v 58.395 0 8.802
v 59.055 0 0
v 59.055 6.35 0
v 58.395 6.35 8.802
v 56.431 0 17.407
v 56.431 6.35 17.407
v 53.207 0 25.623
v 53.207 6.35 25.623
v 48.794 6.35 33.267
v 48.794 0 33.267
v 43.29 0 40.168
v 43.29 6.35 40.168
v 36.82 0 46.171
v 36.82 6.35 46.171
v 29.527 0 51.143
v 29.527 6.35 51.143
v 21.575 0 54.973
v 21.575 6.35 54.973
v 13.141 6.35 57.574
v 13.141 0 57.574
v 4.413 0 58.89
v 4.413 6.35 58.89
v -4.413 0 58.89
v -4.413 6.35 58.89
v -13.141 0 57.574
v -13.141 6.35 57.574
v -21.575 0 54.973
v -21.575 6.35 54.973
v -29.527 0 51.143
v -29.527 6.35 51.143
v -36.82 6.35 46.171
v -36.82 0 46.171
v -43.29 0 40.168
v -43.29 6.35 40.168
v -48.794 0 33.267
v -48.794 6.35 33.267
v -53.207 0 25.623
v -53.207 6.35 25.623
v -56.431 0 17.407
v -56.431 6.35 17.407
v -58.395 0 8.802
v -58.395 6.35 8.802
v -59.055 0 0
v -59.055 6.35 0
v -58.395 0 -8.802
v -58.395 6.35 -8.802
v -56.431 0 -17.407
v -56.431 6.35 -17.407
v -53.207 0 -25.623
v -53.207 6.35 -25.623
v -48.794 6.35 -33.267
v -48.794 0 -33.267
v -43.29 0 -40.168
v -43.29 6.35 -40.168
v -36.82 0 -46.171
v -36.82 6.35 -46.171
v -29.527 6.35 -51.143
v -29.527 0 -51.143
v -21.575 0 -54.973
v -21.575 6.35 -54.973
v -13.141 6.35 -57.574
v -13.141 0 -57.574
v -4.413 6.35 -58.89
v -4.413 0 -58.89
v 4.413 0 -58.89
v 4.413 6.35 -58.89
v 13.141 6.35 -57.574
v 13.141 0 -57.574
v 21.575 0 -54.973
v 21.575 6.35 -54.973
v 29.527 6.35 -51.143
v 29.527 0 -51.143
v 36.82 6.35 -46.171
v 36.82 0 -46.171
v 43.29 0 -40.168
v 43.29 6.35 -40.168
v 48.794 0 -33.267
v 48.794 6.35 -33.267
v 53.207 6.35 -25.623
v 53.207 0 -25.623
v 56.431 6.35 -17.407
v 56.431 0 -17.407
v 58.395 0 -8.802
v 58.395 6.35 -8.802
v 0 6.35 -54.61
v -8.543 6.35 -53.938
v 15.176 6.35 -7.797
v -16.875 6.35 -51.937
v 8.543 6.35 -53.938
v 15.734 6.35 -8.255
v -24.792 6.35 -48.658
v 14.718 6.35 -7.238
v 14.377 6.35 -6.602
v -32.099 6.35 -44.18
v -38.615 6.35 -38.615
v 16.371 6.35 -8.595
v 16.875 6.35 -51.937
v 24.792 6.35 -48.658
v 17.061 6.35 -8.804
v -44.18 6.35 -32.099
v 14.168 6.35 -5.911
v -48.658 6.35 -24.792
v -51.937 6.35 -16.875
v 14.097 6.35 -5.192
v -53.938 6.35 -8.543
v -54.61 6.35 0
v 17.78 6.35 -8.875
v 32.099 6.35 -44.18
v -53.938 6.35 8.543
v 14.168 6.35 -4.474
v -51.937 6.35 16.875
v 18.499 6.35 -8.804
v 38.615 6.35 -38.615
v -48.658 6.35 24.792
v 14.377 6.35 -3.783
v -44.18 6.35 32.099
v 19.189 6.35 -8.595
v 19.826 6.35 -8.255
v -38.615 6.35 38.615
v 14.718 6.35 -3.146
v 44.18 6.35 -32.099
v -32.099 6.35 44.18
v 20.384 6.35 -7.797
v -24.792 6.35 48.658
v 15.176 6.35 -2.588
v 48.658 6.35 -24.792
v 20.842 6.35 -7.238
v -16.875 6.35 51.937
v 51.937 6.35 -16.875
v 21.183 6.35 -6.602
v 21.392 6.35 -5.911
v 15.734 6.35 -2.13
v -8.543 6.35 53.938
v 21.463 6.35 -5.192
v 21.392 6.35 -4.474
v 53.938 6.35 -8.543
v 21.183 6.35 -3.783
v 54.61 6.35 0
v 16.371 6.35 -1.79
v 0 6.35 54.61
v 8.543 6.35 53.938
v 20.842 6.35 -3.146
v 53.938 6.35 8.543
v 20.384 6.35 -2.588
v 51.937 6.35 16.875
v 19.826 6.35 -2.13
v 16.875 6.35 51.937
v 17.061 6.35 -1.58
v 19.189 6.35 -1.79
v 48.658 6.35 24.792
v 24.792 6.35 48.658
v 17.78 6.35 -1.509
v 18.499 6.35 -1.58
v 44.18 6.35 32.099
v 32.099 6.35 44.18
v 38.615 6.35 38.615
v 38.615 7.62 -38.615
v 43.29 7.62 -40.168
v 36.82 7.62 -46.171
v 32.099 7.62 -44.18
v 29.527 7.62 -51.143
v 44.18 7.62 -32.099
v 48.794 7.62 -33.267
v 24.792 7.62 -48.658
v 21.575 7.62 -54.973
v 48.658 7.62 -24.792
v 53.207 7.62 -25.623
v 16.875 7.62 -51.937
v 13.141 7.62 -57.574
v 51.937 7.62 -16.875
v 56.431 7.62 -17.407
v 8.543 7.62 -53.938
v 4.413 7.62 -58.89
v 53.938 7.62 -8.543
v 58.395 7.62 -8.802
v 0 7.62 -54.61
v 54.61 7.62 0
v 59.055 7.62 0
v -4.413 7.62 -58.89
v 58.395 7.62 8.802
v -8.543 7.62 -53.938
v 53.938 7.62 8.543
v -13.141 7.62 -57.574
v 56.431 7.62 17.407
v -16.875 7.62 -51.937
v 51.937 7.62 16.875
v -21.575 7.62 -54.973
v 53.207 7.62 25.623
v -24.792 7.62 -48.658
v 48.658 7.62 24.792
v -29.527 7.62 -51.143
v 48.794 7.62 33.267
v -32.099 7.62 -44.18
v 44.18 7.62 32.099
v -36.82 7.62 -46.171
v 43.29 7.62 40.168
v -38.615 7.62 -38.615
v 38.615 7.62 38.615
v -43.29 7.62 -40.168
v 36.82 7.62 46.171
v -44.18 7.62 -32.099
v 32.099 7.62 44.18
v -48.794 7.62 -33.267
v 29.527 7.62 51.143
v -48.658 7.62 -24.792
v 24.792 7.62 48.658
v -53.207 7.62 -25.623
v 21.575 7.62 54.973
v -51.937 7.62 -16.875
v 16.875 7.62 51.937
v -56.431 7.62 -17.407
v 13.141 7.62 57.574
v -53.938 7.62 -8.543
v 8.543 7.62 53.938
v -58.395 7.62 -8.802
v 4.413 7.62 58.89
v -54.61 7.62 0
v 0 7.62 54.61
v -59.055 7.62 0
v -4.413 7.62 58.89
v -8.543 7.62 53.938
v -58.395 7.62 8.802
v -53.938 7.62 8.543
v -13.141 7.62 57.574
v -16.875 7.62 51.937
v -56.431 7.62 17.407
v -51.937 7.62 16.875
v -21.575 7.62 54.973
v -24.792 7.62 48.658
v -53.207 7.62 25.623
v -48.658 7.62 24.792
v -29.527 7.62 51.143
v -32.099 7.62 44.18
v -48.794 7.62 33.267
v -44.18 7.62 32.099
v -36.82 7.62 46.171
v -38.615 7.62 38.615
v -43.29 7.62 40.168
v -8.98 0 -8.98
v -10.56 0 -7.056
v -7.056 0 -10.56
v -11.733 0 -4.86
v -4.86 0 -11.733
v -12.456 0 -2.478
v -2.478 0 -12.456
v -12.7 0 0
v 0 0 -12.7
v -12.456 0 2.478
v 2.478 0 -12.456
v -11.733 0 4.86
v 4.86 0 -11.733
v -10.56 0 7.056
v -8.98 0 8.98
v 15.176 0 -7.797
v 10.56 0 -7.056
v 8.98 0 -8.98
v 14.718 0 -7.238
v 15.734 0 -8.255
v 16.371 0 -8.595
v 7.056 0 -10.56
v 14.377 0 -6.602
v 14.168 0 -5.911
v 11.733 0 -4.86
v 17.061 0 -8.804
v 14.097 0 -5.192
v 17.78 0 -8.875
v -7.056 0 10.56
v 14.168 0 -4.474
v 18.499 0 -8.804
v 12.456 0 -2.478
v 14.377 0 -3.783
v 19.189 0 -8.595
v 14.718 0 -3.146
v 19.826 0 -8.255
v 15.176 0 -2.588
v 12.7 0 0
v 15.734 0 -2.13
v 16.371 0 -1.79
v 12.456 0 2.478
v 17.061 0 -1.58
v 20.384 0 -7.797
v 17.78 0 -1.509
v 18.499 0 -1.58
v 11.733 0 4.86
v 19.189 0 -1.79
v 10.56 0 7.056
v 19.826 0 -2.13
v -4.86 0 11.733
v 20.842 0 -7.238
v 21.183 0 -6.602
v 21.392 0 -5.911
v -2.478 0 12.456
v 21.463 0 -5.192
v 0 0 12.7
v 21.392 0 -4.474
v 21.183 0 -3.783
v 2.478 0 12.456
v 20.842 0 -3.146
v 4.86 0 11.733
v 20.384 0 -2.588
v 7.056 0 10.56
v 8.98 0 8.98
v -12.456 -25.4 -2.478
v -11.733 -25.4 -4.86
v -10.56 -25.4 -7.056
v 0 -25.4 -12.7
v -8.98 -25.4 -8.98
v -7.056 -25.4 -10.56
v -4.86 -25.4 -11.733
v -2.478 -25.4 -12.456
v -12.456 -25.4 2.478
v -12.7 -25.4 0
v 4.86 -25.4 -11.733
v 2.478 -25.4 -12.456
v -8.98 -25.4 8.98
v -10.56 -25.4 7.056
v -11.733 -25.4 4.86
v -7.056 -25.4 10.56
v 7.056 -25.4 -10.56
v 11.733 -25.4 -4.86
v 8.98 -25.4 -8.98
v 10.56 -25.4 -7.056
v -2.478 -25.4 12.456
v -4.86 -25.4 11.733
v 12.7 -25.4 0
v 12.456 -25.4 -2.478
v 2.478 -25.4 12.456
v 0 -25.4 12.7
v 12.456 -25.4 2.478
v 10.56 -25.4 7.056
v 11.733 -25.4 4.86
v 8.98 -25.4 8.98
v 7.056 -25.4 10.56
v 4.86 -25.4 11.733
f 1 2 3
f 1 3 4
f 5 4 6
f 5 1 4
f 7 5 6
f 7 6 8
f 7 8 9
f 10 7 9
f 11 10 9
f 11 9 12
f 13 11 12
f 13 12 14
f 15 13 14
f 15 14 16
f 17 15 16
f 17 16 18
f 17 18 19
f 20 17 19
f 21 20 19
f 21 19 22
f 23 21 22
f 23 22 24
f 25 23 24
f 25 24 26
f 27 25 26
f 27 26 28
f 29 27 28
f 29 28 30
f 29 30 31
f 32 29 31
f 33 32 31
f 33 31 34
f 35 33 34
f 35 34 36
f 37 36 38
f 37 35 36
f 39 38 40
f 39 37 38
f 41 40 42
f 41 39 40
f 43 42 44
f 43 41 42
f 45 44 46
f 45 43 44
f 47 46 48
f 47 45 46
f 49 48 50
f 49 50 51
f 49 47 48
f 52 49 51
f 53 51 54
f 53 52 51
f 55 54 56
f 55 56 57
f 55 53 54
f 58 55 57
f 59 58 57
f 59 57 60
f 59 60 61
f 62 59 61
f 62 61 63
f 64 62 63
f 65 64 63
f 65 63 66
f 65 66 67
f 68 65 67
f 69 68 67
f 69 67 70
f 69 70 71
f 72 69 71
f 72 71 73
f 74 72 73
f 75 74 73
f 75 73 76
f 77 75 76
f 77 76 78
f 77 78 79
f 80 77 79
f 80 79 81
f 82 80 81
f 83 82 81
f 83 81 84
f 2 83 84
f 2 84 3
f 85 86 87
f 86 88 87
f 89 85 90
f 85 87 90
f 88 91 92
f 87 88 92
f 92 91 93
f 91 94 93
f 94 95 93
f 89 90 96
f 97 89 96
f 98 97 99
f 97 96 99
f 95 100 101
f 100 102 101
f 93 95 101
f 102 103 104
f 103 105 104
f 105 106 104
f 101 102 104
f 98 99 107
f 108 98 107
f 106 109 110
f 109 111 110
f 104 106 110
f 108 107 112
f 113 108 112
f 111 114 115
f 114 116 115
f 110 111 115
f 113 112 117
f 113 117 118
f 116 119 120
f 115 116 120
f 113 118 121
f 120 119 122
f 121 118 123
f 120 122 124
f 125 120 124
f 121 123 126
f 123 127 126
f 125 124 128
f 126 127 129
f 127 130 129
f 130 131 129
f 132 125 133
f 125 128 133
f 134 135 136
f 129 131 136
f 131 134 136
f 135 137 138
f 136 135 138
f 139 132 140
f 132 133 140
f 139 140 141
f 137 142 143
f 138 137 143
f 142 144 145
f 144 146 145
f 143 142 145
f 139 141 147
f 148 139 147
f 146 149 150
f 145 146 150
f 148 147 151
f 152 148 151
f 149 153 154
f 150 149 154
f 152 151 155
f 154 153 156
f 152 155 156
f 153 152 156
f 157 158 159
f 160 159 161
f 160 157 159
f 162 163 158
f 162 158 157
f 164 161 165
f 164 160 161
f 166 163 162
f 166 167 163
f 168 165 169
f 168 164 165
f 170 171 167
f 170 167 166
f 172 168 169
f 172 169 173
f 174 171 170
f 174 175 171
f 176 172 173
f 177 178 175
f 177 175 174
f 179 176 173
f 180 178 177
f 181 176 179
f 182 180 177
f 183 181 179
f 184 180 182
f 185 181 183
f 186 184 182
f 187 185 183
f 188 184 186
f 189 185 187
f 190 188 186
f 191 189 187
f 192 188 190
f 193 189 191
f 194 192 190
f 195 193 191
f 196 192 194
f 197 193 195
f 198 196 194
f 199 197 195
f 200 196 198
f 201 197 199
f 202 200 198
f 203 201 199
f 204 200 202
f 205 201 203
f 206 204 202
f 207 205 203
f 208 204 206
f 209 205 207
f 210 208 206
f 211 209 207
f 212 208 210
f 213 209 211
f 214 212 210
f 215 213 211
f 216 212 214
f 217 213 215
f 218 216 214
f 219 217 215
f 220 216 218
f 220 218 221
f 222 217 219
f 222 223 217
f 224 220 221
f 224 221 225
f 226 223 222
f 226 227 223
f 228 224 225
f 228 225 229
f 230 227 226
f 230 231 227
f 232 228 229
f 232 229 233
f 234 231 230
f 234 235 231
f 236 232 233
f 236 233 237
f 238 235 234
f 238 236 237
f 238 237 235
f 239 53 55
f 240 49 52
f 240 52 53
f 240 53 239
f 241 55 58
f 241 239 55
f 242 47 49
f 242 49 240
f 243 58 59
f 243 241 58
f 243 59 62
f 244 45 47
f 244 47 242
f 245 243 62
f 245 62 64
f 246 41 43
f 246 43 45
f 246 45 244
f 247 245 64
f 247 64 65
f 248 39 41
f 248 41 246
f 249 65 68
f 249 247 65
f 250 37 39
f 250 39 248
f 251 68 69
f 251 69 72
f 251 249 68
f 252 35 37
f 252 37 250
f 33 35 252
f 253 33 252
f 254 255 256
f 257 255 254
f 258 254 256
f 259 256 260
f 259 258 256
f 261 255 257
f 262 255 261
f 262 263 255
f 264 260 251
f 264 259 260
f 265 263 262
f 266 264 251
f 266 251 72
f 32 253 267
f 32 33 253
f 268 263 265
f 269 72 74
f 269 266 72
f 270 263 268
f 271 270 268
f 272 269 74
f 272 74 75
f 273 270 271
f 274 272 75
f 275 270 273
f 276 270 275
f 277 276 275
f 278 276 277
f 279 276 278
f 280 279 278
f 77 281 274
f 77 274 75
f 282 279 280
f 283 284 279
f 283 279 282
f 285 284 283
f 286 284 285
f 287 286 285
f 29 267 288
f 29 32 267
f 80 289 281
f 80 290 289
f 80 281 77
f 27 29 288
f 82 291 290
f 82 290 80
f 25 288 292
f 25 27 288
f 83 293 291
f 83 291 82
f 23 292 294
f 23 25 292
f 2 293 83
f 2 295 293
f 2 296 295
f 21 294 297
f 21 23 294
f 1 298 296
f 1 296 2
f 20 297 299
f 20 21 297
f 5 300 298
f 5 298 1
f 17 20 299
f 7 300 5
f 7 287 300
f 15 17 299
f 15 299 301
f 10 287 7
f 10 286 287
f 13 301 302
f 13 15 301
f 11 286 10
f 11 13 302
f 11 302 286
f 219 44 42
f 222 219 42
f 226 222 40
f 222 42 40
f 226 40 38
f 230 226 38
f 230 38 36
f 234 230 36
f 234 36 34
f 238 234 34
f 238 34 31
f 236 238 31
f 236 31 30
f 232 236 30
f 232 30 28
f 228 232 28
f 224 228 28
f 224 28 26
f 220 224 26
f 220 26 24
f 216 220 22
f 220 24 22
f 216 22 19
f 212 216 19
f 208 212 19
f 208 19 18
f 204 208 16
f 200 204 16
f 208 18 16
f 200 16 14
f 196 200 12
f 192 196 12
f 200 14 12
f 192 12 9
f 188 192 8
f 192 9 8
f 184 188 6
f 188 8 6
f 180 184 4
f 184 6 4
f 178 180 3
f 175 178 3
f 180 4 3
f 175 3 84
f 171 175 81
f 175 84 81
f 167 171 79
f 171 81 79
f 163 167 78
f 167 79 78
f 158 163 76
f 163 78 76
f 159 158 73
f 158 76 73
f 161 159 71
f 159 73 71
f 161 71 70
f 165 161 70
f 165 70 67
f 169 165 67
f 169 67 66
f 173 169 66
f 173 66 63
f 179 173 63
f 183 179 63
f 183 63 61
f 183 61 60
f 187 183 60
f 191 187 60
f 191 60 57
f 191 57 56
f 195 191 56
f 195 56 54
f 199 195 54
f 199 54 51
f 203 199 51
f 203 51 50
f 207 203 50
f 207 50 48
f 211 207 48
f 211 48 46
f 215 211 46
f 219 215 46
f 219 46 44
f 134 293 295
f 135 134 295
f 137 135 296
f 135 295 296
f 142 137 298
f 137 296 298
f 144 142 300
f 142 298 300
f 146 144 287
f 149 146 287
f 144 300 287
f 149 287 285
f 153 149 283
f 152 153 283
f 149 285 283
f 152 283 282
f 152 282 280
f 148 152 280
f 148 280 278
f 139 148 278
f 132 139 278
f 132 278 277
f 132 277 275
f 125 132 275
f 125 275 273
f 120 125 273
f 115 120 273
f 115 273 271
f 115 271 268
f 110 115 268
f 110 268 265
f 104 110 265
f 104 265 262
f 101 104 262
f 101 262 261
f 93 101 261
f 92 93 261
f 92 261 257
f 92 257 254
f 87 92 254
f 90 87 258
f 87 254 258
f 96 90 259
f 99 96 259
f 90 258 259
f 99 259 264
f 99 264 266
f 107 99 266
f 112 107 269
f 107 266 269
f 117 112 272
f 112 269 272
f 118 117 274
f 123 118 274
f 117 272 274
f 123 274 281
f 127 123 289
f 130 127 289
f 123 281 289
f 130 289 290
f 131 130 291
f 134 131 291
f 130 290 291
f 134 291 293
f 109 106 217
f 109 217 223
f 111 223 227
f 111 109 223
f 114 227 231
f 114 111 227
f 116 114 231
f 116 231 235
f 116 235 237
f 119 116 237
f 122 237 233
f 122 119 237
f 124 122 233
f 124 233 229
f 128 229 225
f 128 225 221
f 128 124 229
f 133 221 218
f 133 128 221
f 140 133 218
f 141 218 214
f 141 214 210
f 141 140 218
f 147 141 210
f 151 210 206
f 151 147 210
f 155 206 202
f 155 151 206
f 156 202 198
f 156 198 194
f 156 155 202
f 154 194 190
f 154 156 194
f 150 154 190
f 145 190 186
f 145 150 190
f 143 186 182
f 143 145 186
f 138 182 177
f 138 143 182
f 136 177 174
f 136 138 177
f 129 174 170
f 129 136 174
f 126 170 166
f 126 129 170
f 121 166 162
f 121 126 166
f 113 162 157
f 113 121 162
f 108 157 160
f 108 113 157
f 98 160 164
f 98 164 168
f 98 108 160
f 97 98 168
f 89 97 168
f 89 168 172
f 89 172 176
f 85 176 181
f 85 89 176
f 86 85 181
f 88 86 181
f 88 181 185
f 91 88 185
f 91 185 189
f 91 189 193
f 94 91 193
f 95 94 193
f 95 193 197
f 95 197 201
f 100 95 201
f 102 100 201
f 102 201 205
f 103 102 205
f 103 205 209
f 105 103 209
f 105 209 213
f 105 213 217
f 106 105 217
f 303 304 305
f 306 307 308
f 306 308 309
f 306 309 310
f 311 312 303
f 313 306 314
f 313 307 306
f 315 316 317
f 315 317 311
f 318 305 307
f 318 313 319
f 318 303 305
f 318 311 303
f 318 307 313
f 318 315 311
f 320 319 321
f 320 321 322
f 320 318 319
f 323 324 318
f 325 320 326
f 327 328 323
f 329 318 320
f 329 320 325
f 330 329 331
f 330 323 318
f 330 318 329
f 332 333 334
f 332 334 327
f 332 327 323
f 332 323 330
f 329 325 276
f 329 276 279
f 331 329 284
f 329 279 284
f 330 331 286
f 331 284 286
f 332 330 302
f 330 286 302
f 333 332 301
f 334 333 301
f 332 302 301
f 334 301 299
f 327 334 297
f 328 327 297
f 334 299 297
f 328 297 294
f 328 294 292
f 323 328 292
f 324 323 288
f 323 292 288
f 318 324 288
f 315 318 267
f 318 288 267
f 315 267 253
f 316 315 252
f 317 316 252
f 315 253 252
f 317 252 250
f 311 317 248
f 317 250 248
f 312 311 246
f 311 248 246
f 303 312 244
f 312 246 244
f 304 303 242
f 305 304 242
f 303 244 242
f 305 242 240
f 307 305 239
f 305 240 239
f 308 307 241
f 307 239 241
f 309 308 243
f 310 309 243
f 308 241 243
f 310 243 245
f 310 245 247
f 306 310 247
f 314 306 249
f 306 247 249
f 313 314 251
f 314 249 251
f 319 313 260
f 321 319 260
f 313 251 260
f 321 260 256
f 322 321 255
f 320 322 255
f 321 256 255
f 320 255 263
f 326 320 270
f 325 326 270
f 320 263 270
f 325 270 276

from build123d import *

# Parameters (mm, degrees)
F1_R     = 12.7
F2_DEPTH = 25.4
F0_R     = 59.055
F3_DEPTH = 6.35
F4_R     = 3.683
F5_DEPTH = 6.351
F6_R     = 59.055
F6_R_2   = 54.61
F7_DEPTH = 1.27


with BuildPart() as f2:
    # F1 (on Front) → F2 (new body)
    with BuildSketch(Plane.XZ):
        Circle(F1_R)
    extrude(amount=F2_DEPTH)

    # F0 (on Front) → F3 (join)
    with BuildSketch(Plane.XZ):
        Circle(F0_R)
    extrude(amount=-F3_DEPTH)

    # F4 (on Front) → F5 (cut, through all)
    with BuildSketch(Plane.XZ):
        with Locations((17.78, -5.192251)):
            Circle(F4_R)
    extrude(amount=-F5_DEPTH, mode=Mode.SUBTRACT)

    # F6 (on face) → F7 (join)
    with BuildSketch(Plane(origin=(0, 6.35, 0), x_dir=(-1, 0, 0), z_dir=(0, 1, 0))):
        Circle(F6_R)
        Circle(F6_R_2, mode=Mode.SUBTRACT)
    extrude(amount=F7_DEPTH)


solid = f2.part
